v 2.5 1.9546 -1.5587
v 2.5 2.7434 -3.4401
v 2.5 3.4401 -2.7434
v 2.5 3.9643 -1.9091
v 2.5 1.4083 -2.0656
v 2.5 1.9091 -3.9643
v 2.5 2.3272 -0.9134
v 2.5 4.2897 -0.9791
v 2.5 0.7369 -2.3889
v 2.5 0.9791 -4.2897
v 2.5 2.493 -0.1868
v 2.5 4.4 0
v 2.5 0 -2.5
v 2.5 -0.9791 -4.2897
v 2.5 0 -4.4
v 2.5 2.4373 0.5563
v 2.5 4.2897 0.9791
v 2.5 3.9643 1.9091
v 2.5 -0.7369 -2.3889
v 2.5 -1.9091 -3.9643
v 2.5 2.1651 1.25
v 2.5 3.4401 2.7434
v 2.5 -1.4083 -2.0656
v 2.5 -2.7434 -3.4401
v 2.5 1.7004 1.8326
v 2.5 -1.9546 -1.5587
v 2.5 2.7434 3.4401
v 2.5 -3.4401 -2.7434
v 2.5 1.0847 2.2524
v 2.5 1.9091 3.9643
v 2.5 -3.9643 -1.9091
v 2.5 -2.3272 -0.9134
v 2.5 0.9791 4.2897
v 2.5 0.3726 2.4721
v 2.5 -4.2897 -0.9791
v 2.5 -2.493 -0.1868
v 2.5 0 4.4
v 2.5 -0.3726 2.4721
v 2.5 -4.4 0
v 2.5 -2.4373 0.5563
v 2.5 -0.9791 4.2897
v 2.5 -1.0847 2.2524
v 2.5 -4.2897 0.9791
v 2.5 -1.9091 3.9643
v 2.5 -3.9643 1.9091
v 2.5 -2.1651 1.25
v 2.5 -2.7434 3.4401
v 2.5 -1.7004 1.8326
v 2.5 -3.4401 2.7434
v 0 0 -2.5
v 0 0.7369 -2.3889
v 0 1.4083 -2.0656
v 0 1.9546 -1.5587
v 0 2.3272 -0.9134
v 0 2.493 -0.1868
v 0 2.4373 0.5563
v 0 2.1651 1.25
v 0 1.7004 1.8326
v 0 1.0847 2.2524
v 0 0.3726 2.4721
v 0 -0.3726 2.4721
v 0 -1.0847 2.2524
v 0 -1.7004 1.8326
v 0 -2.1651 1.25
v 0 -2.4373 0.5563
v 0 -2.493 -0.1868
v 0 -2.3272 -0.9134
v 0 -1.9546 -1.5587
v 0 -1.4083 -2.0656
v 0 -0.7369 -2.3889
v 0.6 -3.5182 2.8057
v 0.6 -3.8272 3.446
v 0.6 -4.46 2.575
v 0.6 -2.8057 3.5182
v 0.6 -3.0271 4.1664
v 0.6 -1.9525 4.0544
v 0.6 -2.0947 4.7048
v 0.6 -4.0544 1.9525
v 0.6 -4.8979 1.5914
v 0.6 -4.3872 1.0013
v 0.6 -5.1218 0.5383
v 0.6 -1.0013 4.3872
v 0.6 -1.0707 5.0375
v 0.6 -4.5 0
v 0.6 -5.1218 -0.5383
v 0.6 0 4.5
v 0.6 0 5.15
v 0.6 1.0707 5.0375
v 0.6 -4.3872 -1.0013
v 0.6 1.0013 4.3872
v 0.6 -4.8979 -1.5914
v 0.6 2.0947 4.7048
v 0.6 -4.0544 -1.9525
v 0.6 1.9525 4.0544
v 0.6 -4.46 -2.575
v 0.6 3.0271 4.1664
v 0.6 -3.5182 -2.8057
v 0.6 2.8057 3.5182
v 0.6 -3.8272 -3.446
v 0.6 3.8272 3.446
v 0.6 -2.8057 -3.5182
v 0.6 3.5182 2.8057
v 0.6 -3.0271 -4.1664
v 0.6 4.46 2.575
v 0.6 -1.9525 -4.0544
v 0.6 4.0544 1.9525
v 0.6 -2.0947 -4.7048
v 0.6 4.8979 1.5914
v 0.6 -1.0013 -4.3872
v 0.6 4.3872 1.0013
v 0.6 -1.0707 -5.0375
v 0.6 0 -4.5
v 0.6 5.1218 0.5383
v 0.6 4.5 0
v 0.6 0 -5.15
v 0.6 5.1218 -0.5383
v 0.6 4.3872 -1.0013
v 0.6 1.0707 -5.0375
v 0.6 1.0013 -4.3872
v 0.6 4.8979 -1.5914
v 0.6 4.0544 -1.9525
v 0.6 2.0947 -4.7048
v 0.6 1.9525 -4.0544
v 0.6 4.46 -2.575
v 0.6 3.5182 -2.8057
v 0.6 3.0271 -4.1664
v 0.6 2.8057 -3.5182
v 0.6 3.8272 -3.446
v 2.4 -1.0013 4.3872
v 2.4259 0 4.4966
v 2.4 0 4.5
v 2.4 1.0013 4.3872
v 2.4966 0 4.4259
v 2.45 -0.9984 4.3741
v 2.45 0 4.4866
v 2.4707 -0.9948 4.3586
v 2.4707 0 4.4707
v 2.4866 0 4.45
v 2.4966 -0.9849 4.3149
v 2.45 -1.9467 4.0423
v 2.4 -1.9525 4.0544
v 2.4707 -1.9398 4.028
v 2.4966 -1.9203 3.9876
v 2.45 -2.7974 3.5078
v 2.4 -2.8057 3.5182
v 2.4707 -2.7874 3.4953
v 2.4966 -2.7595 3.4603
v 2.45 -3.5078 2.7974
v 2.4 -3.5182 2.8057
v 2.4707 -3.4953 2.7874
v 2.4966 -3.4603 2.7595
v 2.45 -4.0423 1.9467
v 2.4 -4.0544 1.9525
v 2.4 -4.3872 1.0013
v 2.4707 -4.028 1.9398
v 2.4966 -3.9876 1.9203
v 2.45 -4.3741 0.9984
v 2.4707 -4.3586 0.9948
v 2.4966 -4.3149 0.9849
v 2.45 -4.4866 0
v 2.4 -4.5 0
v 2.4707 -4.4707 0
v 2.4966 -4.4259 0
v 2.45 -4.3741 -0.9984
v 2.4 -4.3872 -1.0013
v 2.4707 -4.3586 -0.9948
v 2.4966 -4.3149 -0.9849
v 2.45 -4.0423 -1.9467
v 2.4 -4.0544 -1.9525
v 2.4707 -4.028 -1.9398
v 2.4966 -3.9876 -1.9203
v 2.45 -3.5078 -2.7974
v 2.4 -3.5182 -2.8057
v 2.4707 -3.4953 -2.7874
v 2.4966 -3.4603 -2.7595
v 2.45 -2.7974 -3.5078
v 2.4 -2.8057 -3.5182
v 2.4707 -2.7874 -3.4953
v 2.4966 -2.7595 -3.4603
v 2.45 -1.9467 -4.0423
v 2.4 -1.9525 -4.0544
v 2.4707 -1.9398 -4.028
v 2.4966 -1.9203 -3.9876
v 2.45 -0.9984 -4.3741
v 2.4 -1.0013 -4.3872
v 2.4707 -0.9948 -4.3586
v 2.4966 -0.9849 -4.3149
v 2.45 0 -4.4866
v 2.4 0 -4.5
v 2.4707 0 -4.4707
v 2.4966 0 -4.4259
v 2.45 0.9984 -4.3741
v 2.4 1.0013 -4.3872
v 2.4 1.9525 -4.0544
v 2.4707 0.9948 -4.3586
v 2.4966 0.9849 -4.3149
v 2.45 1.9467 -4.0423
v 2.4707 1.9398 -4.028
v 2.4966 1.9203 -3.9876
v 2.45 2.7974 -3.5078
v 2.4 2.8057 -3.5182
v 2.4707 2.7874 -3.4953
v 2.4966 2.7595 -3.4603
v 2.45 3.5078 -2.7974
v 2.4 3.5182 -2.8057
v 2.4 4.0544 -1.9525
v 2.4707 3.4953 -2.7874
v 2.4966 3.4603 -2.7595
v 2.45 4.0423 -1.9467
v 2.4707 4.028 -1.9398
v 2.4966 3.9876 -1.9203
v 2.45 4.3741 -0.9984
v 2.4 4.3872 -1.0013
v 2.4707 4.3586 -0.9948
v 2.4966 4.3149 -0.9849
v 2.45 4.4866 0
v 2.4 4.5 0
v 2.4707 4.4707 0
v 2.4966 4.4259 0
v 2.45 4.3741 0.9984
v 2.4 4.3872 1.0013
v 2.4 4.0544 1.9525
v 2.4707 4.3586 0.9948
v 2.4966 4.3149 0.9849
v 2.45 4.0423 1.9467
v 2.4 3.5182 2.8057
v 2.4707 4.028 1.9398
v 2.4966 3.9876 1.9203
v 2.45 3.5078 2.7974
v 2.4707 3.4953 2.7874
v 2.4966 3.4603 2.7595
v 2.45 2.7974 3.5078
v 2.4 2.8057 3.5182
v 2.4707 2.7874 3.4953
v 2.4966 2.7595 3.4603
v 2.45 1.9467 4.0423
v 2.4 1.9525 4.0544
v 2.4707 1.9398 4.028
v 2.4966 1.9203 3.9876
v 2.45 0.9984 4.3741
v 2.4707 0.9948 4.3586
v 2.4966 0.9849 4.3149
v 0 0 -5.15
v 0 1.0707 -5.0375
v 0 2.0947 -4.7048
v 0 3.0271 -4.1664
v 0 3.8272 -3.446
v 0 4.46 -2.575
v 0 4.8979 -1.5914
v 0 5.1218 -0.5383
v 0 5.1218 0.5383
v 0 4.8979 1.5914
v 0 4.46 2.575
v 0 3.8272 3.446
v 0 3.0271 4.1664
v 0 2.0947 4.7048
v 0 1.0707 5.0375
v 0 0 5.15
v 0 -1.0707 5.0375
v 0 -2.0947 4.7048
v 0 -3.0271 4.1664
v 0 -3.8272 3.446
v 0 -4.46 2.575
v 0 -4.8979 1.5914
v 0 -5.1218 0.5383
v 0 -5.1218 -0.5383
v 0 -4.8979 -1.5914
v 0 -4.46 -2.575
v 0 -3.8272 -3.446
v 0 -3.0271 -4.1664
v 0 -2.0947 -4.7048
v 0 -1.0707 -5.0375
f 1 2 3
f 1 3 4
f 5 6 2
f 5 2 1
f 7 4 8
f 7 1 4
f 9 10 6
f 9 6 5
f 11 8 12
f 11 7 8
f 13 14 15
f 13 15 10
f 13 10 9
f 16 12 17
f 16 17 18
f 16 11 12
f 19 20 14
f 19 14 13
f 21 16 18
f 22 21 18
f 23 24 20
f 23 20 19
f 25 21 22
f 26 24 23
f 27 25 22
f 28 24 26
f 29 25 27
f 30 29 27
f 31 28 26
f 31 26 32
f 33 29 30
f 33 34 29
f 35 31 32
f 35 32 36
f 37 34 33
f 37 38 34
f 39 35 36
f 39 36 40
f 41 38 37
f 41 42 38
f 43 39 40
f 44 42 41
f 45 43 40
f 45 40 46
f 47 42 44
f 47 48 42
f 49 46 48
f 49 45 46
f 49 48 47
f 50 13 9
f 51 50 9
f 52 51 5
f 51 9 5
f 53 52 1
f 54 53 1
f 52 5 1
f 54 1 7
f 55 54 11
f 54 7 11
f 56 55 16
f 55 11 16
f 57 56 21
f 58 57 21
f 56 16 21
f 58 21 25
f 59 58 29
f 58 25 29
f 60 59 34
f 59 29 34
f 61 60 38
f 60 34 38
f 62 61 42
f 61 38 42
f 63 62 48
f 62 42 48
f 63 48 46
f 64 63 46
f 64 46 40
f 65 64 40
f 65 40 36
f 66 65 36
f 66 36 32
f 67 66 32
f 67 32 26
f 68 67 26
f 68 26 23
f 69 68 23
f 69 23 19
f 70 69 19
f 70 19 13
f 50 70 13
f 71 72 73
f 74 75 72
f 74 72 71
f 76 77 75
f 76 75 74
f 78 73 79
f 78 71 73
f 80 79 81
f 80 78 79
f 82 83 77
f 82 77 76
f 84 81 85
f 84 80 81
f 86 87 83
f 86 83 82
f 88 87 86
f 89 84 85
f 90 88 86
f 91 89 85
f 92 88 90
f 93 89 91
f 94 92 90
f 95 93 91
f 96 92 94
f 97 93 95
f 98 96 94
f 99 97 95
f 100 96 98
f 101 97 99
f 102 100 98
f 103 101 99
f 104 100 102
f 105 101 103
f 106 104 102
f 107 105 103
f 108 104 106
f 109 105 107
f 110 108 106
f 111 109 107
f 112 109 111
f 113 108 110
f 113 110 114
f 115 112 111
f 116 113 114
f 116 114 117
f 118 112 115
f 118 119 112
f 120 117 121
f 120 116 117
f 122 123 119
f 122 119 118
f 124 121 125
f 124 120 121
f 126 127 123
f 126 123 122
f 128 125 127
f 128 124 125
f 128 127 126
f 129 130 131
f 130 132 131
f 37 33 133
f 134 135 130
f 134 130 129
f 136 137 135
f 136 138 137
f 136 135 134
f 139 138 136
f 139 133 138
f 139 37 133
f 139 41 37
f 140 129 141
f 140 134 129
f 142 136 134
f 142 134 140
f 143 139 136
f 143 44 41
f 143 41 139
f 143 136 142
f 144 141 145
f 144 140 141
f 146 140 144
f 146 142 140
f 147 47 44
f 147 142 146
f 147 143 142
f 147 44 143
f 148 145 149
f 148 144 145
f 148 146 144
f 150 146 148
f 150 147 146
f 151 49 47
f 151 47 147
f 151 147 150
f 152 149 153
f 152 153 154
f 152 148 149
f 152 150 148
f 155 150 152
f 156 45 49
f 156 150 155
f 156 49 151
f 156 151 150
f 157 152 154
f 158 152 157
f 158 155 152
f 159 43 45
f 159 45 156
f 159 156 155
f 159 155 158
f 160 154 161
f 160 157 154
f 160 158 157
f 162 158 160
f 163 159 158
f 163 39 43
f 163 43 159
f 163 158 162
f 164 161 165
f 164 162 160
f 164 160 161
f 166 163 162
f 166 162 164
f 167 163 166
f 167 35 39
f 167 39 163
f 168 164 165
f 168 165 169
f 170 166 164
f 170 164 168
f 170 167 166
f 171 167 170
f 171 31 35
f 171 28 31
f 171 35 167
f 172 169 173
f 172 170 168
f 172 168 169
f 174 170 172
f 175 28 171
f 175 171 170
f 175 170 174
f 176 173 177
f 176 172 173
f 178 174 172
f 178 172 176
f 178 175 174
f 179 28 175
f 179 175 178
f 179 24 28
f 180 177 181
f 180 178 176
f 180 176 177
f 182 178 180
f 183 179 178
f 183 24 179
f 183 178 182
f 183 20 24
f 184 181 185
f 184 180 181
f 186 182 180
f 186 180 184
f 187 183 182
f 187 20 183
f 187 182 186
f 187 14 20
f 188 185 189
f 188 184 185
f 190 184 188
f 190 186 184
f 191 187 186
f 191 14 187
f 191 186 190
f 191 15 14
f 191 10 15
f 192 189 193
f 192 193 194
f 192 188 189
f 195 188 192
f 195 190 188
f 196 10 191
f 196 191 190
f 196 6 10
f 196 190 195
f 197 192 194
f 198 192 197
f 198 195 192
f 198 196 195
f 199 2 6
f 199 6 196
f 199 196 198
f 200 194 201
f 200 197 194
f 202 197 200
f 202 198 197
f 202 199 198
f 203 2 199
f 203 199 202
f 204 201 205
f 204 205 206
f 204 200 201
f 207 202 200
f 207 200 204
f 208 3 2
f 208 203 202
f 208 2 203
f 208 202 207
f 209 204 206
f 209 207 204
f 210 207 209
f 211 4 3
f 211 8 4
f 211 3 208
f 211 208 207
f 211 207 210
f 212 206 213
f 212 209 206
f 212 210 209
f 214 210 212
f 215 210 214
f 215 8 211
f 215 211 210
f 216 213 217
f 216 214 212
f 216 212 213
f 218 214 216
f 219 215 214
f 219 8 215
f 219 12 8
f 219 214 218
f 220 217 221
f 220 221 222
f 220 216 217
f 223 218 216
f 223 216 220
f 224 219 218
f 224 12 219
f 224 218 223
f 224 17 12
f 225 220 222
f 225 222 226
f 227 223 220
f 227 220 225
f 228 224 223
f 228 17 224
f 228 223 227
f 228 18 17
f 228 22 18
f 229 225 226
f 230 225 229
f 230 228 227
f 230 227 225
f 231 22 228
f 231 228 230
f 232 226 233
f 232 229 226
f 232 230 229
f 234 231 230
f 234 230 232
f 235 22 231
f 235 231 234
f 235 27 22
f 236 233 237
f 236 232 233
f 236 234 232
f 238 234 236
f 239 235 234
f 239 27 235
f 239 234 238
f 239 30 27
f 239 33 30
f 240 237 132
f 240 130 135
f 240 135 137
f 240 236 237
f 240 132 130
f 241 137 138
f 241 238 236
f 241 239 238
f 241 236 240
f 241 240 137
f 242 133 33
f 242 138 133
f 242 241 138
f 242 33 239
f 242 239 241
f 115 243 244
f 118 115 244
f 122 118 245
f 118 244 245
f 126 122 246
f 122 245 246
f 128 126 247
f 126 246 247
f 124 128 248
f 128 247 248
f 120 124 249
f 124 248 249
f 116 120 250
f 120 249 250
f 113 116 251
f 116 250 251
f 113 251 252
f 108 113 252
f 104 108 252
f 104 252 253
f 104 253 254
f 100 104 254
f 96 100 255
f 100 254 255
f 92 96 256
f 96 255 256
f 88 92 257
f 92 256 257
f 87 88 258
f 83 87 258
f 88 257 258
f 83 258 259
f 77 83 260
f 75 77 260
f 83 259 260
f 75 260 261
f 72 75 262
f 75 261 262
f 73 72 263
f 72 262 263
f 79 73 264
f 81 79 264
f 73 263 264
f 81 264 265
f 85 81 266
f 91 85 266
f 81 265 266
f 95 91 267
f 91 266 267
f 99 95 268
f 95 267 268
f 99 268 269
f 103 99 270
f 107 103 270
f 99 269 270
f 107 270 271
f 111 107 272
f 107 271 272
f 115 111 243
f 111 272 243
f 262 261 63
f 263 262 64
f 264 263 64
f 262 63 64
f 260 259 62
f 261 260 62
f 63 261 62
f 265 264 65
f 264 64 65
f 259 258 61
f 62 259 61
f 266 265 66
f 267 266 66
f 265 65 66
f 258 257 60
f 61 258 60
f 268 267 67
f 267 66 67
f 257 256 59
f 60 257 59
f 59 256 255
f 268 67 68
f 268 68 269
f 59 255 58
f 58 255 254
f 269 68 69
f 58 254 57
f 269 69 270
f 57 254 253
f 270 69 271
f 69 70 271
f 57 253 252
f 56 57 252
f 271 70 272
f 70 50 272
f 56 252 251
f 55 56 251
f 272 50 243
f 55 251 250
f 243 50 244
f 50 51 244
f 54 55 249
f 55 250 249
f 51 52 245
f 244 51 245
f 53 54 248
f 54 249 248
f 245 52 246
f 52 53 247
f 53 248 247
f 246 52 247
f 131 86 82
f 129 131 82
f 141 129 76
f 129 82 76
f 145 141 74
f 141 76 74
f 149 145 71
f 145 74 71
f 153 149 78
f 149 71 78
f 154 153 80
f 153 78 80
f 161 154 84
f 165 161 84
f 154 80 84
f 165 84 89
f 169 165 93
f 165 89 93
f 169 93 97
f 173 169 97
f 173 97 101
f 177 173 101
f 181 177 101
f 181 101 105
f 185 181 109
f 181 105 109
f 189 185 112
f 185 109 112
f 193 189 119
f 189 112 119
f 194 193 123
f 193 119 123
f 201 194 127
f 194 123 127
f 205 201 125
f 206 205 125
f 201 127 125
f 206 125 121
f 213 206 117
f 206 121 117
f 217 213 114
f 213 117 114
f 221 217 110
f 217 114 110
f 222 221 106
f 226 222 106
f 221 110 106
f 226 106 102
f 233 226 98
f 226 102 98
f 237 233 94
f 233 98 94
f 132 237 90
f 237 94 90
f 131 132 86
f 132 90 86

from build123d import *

# Parameters (mm, degrees)
SKETCH1_R           = 5.15
BOSS_EXTRUDE1_DEPTH = 0.6
SKETCH2_R           = 4.5
BOSS_EXTRUDE2_DEPTH = 1.9
SKETCH3_R           = 2.5
CUT_EXTRUDE1_DEPTH  = 8.700324668
FILLET1_R           = 0.1


with BuildPart() as part:
    # Sketch1 → Boss-Extrude1 (new body)
    with BuildSketch(Plane(origin=(0, 0, 0), x_dir=(0, 0, -1), z_dir=(1, 0, 0))):
        Circle(SKETCH1_R)
    extrude(amount=BOSS_EXTRUDE1_DEPTH)

    # Sketch2 → Boss-Extrude2 (add)
    with BuildSketch(Plane(origin=(0.6, 0, 0), x_dir=(0, 0, -1), z_dir=(1, 0, 0))):
        with Locations(Location((0, 0, 0), (0, 0, 180))):
            Circle(SKETCH2_R)
    extrude(amount=BOSS_EXTRUDE2_DEPTH)

    # Sketch3 → Cut-Extrude1 (cut, through all)
    with BuildSketch(Plane(origin=(2.5, 0, 0), x_dir=(0, 0, -1), z_dir=(1, 0, 0))):
        Circle(SKETCH3_R)
    extrude(amount=-CUT_EXTRUDE1_DEPTH, mode=Mode.SUBTRACT)

    # Fillet1
    fillet1_edges = [part.edges().sort_by_distance(p)[0] for p in [
        (2.5, 0, -4.5),
    ]]
    fillet(fillet1_edges, radius=FILLET1_R)


solid = part.part
